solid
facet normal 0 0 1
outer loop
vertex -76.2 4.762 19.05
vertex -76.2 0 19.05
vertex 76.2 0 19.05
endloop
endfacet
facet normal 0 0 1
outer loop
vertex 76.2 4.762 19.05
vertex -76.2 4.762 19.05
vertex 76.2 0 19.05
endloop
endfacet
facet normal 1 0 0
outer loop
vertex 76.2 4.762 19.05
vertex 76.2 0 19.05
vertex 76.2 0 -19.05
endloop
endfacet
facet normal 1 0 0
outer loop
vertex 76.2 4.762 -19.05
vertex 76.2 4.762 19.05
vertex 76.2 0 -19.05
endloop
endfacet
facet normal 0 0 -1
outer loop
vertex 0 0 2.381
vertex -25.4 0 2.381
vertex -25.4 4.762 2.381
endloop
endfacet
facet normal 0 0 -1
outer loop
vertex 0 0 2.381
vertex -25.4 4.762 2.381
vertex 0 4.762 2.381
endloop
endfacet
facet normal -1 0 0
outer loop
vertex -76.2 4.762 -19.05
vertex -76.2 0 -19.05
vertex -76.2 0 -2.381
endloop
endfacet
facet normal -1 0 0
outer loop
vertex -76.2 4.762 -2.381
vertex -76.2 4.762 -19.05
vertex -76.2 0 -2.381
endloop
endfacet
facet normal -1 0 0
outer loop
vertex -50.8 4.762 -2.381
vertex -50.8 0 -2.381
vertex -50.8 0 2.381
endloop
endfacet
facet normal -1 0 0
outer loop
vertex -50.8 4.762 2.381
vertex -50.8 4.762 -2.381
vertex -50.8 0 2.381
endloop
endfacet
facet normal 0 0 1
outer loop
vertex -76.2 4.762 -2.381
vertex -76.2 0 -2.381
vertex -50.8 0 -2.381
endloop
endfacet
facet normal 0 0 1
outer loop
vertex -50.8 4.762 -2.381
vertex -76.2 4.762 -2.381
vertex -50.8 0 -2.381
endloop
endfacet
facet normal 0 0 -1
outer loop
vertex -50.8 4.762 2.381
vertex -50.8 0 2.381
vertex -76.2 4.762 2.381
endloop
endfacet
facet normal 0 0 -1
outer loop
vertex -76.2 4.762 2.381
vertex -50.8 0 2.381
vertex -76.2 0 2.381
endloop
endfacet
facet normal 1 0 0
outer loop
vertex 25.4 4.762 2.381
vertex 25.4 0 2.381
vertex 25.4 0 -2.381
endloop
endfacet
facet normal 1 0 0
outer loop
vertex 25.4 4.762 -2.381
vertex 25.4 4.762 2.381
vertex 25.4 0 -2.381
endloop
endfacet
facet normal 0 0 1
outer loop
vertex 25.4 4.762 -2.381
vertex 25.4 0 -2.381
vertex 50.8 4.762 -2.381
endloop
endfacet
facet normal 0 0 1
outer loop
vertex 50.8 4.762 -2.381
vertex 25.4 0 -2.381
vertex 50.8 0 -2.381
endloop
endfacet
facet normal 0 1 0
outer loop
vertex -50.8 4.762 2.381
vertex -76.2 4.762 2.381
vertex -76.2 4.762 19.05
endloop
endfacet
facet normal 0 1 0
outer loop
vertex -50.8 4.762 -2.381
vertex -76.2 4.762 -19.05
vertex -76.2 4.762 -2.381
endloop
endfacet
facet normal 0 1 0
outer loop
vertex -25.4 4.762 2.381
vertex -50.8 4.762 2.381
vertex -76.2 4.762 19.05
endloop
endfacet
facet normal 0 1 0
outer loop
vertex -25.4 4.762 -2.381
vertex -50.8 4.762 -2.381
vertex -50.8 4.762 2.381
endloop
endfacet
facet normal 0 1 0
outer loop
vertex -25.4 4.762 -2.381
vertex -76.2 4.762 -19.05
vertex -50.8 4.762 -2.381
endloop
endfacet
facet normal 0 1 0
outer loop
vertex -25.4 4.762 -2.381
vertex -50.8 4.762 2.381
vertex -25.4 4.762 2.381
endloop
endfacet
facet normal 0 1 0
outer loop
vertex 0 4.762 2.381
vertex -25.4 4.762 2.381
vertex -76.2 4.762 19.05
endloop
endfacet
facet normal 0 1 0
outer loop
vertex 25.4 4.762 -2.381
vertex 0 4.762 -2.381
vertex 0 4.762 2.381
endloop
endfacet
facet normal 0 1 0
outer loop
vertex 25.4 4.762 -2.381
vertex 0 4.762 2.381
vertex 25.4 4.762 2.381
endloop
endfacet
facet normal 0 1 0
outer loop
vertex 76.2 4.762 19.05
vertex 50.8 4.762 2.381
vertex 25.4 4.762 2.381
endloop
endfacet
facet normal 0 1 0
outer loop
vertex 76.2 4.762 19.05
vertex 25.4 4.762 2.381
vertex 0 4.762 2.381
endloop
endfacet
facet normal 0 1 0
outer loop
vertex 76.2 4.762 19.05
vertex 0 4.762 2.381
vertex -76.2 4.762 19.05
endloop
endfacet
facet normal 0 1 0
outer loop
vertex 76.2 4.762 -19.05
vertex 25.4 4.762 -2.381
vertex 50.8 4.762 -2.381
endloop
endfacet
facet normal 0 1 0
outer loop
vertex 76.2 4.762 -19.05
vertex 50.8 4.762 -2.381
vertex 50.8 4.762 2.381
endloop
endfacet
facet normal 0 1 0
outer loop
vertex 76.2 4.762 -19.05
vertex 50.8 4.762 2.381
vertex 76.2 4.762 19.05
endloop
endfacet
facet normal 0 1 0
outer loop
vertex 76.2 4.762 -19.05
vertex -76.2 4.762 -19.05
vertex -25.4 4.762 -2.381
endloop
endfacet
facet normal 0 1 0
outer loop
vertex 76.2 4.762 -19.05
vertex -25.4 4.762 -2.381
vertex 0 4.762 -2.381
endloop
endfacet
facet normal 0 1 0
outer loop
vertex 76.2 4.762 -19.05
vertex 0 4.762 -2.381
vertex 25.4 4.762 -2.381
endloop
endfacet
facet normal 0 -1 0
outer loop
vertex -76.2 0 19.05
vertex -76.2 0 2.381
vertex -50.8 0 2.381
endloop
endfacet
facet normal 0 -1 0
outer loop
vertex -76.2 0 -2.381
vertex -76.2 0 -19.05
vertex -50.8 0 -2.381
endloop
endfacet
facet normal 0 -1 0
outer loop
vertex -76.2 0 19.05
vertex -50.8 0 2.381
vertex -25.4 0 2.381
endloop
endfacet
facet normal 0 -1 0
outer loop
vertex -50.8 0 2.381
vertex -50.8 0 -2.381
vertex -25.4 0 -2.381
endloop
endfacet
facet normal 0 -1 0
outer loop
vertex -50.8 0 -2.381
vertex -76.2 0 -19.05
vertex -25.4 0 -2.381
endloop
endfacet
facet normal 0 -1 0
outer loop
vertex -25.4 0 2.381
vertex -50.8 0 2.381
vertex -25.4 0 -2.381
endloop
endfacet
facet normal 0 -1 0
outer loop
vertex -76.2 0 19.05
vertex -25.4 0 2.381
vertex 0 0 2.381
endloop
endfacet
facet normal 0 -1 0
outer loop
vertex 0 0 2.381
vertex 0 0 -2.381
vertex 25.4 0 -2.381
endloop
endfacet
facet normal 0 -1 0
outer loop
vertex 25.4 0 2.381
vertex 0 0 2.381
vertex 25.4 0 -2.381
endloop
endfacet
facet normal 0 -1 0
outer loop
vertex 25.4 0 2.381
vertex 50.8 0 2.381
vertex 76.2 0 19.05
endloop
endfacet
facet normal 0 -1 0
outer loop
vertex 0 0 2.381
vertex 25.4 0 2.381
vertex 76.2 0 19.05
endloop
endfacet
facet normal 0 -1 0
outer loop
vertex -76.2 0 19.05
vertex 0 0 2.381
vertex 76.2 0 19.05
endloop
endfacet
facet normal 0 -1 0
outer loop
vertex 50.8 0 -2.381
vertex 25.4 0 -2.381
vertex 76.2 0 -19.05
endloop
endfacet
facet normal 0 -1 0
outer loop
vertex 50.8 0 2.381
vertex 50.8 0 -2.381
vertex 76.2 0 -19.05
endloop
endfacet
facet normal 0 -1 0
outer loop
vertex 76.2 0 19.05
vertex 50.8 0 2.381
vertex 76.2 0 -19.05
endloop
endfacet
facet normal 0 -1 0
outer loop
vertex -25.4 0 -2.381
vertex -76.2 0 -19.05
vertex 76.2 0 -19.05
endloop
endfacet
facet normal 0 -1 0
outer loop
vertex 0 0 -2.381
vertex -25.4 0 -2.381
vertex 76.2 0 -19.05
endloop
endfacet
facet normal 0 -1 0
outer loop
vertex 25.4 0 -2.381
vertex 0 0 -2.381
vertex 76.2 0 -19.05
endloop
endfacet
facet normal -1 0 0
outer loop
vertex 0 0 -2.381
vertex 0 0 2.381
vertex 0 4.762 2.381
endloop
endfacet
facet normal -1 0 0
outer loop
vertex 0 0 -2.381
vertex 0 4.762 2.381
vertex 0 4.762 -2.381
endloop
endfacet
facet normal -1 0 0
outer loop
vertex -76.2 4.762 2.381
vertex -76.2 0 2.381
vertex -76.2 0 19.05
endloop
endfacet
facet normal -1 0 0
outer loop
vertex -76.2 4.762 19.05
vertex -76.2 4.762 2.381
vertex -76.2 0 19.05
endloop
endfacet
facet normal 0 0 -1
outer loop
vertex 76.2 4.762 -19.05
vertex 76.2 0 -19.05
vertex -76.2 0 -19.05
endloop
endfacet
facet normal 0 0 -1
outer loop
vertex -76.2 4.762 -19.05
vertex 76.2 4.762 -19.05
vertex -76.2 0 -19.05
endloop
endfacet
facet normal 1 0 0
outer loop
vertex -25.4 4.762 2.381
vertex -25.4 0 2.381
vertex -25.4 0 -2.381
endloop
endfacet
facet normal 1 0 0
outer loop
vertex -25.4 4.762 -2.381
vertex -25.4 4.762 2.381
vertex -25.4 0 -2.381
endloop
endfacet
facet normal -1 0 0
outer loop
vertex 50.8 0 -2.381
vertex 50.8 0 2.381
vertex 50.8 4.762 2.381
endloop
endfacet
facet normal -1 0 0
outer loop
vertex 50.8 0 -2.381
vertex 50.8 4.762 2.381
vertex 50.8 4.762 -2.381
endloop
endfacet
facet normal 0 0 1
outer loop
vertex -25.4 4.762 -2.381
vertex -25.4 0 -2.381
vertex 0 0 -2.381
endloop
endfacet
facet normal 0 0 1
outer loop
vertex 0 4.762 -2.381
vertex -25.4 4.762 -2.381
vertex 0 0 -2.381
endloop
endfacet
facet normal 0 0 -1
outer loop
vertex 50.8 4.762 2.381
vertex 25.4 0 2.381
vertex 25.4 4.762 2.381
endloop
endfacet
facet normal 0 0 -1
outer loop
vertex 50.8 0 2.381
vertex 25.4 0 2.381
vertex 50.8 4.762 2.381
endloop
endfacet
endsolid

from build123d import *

# Parameters (mm, degrees)
SKETCH1_W           = 25.4
SKETCH1_H           = 4.7625
BOSS_EXTRUDE1_DEPTH = 4.7625


with BuildPart() as part:
    # Sketch1 → Boss-Extrude1 (new body)
    with BuildSketch(Plane(origin=(0, 0, 0), x_dir=(1, 0, 0), z_dir=(0, 1, 0))):
        Polygon((-76.2, 19.05), (-76.2, 2.38125), (-50.8, 2.38125), (-50.8, -2.38125), (-76.2, -2.38125), (-76.2, -19.05), (76.2, -19.05), (76.2, 19.05), align=None)
        with Locations((-12.7, 0)):
            Rectangle(SKETCH1_W, SKETCH1_H, mode=Mode.SUBTRACT)
        with Locations((38.1, 0)):
            Rectangle(SKETCH1_W, SKETCH1_H, mode=Mode.SUBTRACT)
    extrude(amount=BOSS_EXTRUDE1_DEPTH)


solid = part.part
